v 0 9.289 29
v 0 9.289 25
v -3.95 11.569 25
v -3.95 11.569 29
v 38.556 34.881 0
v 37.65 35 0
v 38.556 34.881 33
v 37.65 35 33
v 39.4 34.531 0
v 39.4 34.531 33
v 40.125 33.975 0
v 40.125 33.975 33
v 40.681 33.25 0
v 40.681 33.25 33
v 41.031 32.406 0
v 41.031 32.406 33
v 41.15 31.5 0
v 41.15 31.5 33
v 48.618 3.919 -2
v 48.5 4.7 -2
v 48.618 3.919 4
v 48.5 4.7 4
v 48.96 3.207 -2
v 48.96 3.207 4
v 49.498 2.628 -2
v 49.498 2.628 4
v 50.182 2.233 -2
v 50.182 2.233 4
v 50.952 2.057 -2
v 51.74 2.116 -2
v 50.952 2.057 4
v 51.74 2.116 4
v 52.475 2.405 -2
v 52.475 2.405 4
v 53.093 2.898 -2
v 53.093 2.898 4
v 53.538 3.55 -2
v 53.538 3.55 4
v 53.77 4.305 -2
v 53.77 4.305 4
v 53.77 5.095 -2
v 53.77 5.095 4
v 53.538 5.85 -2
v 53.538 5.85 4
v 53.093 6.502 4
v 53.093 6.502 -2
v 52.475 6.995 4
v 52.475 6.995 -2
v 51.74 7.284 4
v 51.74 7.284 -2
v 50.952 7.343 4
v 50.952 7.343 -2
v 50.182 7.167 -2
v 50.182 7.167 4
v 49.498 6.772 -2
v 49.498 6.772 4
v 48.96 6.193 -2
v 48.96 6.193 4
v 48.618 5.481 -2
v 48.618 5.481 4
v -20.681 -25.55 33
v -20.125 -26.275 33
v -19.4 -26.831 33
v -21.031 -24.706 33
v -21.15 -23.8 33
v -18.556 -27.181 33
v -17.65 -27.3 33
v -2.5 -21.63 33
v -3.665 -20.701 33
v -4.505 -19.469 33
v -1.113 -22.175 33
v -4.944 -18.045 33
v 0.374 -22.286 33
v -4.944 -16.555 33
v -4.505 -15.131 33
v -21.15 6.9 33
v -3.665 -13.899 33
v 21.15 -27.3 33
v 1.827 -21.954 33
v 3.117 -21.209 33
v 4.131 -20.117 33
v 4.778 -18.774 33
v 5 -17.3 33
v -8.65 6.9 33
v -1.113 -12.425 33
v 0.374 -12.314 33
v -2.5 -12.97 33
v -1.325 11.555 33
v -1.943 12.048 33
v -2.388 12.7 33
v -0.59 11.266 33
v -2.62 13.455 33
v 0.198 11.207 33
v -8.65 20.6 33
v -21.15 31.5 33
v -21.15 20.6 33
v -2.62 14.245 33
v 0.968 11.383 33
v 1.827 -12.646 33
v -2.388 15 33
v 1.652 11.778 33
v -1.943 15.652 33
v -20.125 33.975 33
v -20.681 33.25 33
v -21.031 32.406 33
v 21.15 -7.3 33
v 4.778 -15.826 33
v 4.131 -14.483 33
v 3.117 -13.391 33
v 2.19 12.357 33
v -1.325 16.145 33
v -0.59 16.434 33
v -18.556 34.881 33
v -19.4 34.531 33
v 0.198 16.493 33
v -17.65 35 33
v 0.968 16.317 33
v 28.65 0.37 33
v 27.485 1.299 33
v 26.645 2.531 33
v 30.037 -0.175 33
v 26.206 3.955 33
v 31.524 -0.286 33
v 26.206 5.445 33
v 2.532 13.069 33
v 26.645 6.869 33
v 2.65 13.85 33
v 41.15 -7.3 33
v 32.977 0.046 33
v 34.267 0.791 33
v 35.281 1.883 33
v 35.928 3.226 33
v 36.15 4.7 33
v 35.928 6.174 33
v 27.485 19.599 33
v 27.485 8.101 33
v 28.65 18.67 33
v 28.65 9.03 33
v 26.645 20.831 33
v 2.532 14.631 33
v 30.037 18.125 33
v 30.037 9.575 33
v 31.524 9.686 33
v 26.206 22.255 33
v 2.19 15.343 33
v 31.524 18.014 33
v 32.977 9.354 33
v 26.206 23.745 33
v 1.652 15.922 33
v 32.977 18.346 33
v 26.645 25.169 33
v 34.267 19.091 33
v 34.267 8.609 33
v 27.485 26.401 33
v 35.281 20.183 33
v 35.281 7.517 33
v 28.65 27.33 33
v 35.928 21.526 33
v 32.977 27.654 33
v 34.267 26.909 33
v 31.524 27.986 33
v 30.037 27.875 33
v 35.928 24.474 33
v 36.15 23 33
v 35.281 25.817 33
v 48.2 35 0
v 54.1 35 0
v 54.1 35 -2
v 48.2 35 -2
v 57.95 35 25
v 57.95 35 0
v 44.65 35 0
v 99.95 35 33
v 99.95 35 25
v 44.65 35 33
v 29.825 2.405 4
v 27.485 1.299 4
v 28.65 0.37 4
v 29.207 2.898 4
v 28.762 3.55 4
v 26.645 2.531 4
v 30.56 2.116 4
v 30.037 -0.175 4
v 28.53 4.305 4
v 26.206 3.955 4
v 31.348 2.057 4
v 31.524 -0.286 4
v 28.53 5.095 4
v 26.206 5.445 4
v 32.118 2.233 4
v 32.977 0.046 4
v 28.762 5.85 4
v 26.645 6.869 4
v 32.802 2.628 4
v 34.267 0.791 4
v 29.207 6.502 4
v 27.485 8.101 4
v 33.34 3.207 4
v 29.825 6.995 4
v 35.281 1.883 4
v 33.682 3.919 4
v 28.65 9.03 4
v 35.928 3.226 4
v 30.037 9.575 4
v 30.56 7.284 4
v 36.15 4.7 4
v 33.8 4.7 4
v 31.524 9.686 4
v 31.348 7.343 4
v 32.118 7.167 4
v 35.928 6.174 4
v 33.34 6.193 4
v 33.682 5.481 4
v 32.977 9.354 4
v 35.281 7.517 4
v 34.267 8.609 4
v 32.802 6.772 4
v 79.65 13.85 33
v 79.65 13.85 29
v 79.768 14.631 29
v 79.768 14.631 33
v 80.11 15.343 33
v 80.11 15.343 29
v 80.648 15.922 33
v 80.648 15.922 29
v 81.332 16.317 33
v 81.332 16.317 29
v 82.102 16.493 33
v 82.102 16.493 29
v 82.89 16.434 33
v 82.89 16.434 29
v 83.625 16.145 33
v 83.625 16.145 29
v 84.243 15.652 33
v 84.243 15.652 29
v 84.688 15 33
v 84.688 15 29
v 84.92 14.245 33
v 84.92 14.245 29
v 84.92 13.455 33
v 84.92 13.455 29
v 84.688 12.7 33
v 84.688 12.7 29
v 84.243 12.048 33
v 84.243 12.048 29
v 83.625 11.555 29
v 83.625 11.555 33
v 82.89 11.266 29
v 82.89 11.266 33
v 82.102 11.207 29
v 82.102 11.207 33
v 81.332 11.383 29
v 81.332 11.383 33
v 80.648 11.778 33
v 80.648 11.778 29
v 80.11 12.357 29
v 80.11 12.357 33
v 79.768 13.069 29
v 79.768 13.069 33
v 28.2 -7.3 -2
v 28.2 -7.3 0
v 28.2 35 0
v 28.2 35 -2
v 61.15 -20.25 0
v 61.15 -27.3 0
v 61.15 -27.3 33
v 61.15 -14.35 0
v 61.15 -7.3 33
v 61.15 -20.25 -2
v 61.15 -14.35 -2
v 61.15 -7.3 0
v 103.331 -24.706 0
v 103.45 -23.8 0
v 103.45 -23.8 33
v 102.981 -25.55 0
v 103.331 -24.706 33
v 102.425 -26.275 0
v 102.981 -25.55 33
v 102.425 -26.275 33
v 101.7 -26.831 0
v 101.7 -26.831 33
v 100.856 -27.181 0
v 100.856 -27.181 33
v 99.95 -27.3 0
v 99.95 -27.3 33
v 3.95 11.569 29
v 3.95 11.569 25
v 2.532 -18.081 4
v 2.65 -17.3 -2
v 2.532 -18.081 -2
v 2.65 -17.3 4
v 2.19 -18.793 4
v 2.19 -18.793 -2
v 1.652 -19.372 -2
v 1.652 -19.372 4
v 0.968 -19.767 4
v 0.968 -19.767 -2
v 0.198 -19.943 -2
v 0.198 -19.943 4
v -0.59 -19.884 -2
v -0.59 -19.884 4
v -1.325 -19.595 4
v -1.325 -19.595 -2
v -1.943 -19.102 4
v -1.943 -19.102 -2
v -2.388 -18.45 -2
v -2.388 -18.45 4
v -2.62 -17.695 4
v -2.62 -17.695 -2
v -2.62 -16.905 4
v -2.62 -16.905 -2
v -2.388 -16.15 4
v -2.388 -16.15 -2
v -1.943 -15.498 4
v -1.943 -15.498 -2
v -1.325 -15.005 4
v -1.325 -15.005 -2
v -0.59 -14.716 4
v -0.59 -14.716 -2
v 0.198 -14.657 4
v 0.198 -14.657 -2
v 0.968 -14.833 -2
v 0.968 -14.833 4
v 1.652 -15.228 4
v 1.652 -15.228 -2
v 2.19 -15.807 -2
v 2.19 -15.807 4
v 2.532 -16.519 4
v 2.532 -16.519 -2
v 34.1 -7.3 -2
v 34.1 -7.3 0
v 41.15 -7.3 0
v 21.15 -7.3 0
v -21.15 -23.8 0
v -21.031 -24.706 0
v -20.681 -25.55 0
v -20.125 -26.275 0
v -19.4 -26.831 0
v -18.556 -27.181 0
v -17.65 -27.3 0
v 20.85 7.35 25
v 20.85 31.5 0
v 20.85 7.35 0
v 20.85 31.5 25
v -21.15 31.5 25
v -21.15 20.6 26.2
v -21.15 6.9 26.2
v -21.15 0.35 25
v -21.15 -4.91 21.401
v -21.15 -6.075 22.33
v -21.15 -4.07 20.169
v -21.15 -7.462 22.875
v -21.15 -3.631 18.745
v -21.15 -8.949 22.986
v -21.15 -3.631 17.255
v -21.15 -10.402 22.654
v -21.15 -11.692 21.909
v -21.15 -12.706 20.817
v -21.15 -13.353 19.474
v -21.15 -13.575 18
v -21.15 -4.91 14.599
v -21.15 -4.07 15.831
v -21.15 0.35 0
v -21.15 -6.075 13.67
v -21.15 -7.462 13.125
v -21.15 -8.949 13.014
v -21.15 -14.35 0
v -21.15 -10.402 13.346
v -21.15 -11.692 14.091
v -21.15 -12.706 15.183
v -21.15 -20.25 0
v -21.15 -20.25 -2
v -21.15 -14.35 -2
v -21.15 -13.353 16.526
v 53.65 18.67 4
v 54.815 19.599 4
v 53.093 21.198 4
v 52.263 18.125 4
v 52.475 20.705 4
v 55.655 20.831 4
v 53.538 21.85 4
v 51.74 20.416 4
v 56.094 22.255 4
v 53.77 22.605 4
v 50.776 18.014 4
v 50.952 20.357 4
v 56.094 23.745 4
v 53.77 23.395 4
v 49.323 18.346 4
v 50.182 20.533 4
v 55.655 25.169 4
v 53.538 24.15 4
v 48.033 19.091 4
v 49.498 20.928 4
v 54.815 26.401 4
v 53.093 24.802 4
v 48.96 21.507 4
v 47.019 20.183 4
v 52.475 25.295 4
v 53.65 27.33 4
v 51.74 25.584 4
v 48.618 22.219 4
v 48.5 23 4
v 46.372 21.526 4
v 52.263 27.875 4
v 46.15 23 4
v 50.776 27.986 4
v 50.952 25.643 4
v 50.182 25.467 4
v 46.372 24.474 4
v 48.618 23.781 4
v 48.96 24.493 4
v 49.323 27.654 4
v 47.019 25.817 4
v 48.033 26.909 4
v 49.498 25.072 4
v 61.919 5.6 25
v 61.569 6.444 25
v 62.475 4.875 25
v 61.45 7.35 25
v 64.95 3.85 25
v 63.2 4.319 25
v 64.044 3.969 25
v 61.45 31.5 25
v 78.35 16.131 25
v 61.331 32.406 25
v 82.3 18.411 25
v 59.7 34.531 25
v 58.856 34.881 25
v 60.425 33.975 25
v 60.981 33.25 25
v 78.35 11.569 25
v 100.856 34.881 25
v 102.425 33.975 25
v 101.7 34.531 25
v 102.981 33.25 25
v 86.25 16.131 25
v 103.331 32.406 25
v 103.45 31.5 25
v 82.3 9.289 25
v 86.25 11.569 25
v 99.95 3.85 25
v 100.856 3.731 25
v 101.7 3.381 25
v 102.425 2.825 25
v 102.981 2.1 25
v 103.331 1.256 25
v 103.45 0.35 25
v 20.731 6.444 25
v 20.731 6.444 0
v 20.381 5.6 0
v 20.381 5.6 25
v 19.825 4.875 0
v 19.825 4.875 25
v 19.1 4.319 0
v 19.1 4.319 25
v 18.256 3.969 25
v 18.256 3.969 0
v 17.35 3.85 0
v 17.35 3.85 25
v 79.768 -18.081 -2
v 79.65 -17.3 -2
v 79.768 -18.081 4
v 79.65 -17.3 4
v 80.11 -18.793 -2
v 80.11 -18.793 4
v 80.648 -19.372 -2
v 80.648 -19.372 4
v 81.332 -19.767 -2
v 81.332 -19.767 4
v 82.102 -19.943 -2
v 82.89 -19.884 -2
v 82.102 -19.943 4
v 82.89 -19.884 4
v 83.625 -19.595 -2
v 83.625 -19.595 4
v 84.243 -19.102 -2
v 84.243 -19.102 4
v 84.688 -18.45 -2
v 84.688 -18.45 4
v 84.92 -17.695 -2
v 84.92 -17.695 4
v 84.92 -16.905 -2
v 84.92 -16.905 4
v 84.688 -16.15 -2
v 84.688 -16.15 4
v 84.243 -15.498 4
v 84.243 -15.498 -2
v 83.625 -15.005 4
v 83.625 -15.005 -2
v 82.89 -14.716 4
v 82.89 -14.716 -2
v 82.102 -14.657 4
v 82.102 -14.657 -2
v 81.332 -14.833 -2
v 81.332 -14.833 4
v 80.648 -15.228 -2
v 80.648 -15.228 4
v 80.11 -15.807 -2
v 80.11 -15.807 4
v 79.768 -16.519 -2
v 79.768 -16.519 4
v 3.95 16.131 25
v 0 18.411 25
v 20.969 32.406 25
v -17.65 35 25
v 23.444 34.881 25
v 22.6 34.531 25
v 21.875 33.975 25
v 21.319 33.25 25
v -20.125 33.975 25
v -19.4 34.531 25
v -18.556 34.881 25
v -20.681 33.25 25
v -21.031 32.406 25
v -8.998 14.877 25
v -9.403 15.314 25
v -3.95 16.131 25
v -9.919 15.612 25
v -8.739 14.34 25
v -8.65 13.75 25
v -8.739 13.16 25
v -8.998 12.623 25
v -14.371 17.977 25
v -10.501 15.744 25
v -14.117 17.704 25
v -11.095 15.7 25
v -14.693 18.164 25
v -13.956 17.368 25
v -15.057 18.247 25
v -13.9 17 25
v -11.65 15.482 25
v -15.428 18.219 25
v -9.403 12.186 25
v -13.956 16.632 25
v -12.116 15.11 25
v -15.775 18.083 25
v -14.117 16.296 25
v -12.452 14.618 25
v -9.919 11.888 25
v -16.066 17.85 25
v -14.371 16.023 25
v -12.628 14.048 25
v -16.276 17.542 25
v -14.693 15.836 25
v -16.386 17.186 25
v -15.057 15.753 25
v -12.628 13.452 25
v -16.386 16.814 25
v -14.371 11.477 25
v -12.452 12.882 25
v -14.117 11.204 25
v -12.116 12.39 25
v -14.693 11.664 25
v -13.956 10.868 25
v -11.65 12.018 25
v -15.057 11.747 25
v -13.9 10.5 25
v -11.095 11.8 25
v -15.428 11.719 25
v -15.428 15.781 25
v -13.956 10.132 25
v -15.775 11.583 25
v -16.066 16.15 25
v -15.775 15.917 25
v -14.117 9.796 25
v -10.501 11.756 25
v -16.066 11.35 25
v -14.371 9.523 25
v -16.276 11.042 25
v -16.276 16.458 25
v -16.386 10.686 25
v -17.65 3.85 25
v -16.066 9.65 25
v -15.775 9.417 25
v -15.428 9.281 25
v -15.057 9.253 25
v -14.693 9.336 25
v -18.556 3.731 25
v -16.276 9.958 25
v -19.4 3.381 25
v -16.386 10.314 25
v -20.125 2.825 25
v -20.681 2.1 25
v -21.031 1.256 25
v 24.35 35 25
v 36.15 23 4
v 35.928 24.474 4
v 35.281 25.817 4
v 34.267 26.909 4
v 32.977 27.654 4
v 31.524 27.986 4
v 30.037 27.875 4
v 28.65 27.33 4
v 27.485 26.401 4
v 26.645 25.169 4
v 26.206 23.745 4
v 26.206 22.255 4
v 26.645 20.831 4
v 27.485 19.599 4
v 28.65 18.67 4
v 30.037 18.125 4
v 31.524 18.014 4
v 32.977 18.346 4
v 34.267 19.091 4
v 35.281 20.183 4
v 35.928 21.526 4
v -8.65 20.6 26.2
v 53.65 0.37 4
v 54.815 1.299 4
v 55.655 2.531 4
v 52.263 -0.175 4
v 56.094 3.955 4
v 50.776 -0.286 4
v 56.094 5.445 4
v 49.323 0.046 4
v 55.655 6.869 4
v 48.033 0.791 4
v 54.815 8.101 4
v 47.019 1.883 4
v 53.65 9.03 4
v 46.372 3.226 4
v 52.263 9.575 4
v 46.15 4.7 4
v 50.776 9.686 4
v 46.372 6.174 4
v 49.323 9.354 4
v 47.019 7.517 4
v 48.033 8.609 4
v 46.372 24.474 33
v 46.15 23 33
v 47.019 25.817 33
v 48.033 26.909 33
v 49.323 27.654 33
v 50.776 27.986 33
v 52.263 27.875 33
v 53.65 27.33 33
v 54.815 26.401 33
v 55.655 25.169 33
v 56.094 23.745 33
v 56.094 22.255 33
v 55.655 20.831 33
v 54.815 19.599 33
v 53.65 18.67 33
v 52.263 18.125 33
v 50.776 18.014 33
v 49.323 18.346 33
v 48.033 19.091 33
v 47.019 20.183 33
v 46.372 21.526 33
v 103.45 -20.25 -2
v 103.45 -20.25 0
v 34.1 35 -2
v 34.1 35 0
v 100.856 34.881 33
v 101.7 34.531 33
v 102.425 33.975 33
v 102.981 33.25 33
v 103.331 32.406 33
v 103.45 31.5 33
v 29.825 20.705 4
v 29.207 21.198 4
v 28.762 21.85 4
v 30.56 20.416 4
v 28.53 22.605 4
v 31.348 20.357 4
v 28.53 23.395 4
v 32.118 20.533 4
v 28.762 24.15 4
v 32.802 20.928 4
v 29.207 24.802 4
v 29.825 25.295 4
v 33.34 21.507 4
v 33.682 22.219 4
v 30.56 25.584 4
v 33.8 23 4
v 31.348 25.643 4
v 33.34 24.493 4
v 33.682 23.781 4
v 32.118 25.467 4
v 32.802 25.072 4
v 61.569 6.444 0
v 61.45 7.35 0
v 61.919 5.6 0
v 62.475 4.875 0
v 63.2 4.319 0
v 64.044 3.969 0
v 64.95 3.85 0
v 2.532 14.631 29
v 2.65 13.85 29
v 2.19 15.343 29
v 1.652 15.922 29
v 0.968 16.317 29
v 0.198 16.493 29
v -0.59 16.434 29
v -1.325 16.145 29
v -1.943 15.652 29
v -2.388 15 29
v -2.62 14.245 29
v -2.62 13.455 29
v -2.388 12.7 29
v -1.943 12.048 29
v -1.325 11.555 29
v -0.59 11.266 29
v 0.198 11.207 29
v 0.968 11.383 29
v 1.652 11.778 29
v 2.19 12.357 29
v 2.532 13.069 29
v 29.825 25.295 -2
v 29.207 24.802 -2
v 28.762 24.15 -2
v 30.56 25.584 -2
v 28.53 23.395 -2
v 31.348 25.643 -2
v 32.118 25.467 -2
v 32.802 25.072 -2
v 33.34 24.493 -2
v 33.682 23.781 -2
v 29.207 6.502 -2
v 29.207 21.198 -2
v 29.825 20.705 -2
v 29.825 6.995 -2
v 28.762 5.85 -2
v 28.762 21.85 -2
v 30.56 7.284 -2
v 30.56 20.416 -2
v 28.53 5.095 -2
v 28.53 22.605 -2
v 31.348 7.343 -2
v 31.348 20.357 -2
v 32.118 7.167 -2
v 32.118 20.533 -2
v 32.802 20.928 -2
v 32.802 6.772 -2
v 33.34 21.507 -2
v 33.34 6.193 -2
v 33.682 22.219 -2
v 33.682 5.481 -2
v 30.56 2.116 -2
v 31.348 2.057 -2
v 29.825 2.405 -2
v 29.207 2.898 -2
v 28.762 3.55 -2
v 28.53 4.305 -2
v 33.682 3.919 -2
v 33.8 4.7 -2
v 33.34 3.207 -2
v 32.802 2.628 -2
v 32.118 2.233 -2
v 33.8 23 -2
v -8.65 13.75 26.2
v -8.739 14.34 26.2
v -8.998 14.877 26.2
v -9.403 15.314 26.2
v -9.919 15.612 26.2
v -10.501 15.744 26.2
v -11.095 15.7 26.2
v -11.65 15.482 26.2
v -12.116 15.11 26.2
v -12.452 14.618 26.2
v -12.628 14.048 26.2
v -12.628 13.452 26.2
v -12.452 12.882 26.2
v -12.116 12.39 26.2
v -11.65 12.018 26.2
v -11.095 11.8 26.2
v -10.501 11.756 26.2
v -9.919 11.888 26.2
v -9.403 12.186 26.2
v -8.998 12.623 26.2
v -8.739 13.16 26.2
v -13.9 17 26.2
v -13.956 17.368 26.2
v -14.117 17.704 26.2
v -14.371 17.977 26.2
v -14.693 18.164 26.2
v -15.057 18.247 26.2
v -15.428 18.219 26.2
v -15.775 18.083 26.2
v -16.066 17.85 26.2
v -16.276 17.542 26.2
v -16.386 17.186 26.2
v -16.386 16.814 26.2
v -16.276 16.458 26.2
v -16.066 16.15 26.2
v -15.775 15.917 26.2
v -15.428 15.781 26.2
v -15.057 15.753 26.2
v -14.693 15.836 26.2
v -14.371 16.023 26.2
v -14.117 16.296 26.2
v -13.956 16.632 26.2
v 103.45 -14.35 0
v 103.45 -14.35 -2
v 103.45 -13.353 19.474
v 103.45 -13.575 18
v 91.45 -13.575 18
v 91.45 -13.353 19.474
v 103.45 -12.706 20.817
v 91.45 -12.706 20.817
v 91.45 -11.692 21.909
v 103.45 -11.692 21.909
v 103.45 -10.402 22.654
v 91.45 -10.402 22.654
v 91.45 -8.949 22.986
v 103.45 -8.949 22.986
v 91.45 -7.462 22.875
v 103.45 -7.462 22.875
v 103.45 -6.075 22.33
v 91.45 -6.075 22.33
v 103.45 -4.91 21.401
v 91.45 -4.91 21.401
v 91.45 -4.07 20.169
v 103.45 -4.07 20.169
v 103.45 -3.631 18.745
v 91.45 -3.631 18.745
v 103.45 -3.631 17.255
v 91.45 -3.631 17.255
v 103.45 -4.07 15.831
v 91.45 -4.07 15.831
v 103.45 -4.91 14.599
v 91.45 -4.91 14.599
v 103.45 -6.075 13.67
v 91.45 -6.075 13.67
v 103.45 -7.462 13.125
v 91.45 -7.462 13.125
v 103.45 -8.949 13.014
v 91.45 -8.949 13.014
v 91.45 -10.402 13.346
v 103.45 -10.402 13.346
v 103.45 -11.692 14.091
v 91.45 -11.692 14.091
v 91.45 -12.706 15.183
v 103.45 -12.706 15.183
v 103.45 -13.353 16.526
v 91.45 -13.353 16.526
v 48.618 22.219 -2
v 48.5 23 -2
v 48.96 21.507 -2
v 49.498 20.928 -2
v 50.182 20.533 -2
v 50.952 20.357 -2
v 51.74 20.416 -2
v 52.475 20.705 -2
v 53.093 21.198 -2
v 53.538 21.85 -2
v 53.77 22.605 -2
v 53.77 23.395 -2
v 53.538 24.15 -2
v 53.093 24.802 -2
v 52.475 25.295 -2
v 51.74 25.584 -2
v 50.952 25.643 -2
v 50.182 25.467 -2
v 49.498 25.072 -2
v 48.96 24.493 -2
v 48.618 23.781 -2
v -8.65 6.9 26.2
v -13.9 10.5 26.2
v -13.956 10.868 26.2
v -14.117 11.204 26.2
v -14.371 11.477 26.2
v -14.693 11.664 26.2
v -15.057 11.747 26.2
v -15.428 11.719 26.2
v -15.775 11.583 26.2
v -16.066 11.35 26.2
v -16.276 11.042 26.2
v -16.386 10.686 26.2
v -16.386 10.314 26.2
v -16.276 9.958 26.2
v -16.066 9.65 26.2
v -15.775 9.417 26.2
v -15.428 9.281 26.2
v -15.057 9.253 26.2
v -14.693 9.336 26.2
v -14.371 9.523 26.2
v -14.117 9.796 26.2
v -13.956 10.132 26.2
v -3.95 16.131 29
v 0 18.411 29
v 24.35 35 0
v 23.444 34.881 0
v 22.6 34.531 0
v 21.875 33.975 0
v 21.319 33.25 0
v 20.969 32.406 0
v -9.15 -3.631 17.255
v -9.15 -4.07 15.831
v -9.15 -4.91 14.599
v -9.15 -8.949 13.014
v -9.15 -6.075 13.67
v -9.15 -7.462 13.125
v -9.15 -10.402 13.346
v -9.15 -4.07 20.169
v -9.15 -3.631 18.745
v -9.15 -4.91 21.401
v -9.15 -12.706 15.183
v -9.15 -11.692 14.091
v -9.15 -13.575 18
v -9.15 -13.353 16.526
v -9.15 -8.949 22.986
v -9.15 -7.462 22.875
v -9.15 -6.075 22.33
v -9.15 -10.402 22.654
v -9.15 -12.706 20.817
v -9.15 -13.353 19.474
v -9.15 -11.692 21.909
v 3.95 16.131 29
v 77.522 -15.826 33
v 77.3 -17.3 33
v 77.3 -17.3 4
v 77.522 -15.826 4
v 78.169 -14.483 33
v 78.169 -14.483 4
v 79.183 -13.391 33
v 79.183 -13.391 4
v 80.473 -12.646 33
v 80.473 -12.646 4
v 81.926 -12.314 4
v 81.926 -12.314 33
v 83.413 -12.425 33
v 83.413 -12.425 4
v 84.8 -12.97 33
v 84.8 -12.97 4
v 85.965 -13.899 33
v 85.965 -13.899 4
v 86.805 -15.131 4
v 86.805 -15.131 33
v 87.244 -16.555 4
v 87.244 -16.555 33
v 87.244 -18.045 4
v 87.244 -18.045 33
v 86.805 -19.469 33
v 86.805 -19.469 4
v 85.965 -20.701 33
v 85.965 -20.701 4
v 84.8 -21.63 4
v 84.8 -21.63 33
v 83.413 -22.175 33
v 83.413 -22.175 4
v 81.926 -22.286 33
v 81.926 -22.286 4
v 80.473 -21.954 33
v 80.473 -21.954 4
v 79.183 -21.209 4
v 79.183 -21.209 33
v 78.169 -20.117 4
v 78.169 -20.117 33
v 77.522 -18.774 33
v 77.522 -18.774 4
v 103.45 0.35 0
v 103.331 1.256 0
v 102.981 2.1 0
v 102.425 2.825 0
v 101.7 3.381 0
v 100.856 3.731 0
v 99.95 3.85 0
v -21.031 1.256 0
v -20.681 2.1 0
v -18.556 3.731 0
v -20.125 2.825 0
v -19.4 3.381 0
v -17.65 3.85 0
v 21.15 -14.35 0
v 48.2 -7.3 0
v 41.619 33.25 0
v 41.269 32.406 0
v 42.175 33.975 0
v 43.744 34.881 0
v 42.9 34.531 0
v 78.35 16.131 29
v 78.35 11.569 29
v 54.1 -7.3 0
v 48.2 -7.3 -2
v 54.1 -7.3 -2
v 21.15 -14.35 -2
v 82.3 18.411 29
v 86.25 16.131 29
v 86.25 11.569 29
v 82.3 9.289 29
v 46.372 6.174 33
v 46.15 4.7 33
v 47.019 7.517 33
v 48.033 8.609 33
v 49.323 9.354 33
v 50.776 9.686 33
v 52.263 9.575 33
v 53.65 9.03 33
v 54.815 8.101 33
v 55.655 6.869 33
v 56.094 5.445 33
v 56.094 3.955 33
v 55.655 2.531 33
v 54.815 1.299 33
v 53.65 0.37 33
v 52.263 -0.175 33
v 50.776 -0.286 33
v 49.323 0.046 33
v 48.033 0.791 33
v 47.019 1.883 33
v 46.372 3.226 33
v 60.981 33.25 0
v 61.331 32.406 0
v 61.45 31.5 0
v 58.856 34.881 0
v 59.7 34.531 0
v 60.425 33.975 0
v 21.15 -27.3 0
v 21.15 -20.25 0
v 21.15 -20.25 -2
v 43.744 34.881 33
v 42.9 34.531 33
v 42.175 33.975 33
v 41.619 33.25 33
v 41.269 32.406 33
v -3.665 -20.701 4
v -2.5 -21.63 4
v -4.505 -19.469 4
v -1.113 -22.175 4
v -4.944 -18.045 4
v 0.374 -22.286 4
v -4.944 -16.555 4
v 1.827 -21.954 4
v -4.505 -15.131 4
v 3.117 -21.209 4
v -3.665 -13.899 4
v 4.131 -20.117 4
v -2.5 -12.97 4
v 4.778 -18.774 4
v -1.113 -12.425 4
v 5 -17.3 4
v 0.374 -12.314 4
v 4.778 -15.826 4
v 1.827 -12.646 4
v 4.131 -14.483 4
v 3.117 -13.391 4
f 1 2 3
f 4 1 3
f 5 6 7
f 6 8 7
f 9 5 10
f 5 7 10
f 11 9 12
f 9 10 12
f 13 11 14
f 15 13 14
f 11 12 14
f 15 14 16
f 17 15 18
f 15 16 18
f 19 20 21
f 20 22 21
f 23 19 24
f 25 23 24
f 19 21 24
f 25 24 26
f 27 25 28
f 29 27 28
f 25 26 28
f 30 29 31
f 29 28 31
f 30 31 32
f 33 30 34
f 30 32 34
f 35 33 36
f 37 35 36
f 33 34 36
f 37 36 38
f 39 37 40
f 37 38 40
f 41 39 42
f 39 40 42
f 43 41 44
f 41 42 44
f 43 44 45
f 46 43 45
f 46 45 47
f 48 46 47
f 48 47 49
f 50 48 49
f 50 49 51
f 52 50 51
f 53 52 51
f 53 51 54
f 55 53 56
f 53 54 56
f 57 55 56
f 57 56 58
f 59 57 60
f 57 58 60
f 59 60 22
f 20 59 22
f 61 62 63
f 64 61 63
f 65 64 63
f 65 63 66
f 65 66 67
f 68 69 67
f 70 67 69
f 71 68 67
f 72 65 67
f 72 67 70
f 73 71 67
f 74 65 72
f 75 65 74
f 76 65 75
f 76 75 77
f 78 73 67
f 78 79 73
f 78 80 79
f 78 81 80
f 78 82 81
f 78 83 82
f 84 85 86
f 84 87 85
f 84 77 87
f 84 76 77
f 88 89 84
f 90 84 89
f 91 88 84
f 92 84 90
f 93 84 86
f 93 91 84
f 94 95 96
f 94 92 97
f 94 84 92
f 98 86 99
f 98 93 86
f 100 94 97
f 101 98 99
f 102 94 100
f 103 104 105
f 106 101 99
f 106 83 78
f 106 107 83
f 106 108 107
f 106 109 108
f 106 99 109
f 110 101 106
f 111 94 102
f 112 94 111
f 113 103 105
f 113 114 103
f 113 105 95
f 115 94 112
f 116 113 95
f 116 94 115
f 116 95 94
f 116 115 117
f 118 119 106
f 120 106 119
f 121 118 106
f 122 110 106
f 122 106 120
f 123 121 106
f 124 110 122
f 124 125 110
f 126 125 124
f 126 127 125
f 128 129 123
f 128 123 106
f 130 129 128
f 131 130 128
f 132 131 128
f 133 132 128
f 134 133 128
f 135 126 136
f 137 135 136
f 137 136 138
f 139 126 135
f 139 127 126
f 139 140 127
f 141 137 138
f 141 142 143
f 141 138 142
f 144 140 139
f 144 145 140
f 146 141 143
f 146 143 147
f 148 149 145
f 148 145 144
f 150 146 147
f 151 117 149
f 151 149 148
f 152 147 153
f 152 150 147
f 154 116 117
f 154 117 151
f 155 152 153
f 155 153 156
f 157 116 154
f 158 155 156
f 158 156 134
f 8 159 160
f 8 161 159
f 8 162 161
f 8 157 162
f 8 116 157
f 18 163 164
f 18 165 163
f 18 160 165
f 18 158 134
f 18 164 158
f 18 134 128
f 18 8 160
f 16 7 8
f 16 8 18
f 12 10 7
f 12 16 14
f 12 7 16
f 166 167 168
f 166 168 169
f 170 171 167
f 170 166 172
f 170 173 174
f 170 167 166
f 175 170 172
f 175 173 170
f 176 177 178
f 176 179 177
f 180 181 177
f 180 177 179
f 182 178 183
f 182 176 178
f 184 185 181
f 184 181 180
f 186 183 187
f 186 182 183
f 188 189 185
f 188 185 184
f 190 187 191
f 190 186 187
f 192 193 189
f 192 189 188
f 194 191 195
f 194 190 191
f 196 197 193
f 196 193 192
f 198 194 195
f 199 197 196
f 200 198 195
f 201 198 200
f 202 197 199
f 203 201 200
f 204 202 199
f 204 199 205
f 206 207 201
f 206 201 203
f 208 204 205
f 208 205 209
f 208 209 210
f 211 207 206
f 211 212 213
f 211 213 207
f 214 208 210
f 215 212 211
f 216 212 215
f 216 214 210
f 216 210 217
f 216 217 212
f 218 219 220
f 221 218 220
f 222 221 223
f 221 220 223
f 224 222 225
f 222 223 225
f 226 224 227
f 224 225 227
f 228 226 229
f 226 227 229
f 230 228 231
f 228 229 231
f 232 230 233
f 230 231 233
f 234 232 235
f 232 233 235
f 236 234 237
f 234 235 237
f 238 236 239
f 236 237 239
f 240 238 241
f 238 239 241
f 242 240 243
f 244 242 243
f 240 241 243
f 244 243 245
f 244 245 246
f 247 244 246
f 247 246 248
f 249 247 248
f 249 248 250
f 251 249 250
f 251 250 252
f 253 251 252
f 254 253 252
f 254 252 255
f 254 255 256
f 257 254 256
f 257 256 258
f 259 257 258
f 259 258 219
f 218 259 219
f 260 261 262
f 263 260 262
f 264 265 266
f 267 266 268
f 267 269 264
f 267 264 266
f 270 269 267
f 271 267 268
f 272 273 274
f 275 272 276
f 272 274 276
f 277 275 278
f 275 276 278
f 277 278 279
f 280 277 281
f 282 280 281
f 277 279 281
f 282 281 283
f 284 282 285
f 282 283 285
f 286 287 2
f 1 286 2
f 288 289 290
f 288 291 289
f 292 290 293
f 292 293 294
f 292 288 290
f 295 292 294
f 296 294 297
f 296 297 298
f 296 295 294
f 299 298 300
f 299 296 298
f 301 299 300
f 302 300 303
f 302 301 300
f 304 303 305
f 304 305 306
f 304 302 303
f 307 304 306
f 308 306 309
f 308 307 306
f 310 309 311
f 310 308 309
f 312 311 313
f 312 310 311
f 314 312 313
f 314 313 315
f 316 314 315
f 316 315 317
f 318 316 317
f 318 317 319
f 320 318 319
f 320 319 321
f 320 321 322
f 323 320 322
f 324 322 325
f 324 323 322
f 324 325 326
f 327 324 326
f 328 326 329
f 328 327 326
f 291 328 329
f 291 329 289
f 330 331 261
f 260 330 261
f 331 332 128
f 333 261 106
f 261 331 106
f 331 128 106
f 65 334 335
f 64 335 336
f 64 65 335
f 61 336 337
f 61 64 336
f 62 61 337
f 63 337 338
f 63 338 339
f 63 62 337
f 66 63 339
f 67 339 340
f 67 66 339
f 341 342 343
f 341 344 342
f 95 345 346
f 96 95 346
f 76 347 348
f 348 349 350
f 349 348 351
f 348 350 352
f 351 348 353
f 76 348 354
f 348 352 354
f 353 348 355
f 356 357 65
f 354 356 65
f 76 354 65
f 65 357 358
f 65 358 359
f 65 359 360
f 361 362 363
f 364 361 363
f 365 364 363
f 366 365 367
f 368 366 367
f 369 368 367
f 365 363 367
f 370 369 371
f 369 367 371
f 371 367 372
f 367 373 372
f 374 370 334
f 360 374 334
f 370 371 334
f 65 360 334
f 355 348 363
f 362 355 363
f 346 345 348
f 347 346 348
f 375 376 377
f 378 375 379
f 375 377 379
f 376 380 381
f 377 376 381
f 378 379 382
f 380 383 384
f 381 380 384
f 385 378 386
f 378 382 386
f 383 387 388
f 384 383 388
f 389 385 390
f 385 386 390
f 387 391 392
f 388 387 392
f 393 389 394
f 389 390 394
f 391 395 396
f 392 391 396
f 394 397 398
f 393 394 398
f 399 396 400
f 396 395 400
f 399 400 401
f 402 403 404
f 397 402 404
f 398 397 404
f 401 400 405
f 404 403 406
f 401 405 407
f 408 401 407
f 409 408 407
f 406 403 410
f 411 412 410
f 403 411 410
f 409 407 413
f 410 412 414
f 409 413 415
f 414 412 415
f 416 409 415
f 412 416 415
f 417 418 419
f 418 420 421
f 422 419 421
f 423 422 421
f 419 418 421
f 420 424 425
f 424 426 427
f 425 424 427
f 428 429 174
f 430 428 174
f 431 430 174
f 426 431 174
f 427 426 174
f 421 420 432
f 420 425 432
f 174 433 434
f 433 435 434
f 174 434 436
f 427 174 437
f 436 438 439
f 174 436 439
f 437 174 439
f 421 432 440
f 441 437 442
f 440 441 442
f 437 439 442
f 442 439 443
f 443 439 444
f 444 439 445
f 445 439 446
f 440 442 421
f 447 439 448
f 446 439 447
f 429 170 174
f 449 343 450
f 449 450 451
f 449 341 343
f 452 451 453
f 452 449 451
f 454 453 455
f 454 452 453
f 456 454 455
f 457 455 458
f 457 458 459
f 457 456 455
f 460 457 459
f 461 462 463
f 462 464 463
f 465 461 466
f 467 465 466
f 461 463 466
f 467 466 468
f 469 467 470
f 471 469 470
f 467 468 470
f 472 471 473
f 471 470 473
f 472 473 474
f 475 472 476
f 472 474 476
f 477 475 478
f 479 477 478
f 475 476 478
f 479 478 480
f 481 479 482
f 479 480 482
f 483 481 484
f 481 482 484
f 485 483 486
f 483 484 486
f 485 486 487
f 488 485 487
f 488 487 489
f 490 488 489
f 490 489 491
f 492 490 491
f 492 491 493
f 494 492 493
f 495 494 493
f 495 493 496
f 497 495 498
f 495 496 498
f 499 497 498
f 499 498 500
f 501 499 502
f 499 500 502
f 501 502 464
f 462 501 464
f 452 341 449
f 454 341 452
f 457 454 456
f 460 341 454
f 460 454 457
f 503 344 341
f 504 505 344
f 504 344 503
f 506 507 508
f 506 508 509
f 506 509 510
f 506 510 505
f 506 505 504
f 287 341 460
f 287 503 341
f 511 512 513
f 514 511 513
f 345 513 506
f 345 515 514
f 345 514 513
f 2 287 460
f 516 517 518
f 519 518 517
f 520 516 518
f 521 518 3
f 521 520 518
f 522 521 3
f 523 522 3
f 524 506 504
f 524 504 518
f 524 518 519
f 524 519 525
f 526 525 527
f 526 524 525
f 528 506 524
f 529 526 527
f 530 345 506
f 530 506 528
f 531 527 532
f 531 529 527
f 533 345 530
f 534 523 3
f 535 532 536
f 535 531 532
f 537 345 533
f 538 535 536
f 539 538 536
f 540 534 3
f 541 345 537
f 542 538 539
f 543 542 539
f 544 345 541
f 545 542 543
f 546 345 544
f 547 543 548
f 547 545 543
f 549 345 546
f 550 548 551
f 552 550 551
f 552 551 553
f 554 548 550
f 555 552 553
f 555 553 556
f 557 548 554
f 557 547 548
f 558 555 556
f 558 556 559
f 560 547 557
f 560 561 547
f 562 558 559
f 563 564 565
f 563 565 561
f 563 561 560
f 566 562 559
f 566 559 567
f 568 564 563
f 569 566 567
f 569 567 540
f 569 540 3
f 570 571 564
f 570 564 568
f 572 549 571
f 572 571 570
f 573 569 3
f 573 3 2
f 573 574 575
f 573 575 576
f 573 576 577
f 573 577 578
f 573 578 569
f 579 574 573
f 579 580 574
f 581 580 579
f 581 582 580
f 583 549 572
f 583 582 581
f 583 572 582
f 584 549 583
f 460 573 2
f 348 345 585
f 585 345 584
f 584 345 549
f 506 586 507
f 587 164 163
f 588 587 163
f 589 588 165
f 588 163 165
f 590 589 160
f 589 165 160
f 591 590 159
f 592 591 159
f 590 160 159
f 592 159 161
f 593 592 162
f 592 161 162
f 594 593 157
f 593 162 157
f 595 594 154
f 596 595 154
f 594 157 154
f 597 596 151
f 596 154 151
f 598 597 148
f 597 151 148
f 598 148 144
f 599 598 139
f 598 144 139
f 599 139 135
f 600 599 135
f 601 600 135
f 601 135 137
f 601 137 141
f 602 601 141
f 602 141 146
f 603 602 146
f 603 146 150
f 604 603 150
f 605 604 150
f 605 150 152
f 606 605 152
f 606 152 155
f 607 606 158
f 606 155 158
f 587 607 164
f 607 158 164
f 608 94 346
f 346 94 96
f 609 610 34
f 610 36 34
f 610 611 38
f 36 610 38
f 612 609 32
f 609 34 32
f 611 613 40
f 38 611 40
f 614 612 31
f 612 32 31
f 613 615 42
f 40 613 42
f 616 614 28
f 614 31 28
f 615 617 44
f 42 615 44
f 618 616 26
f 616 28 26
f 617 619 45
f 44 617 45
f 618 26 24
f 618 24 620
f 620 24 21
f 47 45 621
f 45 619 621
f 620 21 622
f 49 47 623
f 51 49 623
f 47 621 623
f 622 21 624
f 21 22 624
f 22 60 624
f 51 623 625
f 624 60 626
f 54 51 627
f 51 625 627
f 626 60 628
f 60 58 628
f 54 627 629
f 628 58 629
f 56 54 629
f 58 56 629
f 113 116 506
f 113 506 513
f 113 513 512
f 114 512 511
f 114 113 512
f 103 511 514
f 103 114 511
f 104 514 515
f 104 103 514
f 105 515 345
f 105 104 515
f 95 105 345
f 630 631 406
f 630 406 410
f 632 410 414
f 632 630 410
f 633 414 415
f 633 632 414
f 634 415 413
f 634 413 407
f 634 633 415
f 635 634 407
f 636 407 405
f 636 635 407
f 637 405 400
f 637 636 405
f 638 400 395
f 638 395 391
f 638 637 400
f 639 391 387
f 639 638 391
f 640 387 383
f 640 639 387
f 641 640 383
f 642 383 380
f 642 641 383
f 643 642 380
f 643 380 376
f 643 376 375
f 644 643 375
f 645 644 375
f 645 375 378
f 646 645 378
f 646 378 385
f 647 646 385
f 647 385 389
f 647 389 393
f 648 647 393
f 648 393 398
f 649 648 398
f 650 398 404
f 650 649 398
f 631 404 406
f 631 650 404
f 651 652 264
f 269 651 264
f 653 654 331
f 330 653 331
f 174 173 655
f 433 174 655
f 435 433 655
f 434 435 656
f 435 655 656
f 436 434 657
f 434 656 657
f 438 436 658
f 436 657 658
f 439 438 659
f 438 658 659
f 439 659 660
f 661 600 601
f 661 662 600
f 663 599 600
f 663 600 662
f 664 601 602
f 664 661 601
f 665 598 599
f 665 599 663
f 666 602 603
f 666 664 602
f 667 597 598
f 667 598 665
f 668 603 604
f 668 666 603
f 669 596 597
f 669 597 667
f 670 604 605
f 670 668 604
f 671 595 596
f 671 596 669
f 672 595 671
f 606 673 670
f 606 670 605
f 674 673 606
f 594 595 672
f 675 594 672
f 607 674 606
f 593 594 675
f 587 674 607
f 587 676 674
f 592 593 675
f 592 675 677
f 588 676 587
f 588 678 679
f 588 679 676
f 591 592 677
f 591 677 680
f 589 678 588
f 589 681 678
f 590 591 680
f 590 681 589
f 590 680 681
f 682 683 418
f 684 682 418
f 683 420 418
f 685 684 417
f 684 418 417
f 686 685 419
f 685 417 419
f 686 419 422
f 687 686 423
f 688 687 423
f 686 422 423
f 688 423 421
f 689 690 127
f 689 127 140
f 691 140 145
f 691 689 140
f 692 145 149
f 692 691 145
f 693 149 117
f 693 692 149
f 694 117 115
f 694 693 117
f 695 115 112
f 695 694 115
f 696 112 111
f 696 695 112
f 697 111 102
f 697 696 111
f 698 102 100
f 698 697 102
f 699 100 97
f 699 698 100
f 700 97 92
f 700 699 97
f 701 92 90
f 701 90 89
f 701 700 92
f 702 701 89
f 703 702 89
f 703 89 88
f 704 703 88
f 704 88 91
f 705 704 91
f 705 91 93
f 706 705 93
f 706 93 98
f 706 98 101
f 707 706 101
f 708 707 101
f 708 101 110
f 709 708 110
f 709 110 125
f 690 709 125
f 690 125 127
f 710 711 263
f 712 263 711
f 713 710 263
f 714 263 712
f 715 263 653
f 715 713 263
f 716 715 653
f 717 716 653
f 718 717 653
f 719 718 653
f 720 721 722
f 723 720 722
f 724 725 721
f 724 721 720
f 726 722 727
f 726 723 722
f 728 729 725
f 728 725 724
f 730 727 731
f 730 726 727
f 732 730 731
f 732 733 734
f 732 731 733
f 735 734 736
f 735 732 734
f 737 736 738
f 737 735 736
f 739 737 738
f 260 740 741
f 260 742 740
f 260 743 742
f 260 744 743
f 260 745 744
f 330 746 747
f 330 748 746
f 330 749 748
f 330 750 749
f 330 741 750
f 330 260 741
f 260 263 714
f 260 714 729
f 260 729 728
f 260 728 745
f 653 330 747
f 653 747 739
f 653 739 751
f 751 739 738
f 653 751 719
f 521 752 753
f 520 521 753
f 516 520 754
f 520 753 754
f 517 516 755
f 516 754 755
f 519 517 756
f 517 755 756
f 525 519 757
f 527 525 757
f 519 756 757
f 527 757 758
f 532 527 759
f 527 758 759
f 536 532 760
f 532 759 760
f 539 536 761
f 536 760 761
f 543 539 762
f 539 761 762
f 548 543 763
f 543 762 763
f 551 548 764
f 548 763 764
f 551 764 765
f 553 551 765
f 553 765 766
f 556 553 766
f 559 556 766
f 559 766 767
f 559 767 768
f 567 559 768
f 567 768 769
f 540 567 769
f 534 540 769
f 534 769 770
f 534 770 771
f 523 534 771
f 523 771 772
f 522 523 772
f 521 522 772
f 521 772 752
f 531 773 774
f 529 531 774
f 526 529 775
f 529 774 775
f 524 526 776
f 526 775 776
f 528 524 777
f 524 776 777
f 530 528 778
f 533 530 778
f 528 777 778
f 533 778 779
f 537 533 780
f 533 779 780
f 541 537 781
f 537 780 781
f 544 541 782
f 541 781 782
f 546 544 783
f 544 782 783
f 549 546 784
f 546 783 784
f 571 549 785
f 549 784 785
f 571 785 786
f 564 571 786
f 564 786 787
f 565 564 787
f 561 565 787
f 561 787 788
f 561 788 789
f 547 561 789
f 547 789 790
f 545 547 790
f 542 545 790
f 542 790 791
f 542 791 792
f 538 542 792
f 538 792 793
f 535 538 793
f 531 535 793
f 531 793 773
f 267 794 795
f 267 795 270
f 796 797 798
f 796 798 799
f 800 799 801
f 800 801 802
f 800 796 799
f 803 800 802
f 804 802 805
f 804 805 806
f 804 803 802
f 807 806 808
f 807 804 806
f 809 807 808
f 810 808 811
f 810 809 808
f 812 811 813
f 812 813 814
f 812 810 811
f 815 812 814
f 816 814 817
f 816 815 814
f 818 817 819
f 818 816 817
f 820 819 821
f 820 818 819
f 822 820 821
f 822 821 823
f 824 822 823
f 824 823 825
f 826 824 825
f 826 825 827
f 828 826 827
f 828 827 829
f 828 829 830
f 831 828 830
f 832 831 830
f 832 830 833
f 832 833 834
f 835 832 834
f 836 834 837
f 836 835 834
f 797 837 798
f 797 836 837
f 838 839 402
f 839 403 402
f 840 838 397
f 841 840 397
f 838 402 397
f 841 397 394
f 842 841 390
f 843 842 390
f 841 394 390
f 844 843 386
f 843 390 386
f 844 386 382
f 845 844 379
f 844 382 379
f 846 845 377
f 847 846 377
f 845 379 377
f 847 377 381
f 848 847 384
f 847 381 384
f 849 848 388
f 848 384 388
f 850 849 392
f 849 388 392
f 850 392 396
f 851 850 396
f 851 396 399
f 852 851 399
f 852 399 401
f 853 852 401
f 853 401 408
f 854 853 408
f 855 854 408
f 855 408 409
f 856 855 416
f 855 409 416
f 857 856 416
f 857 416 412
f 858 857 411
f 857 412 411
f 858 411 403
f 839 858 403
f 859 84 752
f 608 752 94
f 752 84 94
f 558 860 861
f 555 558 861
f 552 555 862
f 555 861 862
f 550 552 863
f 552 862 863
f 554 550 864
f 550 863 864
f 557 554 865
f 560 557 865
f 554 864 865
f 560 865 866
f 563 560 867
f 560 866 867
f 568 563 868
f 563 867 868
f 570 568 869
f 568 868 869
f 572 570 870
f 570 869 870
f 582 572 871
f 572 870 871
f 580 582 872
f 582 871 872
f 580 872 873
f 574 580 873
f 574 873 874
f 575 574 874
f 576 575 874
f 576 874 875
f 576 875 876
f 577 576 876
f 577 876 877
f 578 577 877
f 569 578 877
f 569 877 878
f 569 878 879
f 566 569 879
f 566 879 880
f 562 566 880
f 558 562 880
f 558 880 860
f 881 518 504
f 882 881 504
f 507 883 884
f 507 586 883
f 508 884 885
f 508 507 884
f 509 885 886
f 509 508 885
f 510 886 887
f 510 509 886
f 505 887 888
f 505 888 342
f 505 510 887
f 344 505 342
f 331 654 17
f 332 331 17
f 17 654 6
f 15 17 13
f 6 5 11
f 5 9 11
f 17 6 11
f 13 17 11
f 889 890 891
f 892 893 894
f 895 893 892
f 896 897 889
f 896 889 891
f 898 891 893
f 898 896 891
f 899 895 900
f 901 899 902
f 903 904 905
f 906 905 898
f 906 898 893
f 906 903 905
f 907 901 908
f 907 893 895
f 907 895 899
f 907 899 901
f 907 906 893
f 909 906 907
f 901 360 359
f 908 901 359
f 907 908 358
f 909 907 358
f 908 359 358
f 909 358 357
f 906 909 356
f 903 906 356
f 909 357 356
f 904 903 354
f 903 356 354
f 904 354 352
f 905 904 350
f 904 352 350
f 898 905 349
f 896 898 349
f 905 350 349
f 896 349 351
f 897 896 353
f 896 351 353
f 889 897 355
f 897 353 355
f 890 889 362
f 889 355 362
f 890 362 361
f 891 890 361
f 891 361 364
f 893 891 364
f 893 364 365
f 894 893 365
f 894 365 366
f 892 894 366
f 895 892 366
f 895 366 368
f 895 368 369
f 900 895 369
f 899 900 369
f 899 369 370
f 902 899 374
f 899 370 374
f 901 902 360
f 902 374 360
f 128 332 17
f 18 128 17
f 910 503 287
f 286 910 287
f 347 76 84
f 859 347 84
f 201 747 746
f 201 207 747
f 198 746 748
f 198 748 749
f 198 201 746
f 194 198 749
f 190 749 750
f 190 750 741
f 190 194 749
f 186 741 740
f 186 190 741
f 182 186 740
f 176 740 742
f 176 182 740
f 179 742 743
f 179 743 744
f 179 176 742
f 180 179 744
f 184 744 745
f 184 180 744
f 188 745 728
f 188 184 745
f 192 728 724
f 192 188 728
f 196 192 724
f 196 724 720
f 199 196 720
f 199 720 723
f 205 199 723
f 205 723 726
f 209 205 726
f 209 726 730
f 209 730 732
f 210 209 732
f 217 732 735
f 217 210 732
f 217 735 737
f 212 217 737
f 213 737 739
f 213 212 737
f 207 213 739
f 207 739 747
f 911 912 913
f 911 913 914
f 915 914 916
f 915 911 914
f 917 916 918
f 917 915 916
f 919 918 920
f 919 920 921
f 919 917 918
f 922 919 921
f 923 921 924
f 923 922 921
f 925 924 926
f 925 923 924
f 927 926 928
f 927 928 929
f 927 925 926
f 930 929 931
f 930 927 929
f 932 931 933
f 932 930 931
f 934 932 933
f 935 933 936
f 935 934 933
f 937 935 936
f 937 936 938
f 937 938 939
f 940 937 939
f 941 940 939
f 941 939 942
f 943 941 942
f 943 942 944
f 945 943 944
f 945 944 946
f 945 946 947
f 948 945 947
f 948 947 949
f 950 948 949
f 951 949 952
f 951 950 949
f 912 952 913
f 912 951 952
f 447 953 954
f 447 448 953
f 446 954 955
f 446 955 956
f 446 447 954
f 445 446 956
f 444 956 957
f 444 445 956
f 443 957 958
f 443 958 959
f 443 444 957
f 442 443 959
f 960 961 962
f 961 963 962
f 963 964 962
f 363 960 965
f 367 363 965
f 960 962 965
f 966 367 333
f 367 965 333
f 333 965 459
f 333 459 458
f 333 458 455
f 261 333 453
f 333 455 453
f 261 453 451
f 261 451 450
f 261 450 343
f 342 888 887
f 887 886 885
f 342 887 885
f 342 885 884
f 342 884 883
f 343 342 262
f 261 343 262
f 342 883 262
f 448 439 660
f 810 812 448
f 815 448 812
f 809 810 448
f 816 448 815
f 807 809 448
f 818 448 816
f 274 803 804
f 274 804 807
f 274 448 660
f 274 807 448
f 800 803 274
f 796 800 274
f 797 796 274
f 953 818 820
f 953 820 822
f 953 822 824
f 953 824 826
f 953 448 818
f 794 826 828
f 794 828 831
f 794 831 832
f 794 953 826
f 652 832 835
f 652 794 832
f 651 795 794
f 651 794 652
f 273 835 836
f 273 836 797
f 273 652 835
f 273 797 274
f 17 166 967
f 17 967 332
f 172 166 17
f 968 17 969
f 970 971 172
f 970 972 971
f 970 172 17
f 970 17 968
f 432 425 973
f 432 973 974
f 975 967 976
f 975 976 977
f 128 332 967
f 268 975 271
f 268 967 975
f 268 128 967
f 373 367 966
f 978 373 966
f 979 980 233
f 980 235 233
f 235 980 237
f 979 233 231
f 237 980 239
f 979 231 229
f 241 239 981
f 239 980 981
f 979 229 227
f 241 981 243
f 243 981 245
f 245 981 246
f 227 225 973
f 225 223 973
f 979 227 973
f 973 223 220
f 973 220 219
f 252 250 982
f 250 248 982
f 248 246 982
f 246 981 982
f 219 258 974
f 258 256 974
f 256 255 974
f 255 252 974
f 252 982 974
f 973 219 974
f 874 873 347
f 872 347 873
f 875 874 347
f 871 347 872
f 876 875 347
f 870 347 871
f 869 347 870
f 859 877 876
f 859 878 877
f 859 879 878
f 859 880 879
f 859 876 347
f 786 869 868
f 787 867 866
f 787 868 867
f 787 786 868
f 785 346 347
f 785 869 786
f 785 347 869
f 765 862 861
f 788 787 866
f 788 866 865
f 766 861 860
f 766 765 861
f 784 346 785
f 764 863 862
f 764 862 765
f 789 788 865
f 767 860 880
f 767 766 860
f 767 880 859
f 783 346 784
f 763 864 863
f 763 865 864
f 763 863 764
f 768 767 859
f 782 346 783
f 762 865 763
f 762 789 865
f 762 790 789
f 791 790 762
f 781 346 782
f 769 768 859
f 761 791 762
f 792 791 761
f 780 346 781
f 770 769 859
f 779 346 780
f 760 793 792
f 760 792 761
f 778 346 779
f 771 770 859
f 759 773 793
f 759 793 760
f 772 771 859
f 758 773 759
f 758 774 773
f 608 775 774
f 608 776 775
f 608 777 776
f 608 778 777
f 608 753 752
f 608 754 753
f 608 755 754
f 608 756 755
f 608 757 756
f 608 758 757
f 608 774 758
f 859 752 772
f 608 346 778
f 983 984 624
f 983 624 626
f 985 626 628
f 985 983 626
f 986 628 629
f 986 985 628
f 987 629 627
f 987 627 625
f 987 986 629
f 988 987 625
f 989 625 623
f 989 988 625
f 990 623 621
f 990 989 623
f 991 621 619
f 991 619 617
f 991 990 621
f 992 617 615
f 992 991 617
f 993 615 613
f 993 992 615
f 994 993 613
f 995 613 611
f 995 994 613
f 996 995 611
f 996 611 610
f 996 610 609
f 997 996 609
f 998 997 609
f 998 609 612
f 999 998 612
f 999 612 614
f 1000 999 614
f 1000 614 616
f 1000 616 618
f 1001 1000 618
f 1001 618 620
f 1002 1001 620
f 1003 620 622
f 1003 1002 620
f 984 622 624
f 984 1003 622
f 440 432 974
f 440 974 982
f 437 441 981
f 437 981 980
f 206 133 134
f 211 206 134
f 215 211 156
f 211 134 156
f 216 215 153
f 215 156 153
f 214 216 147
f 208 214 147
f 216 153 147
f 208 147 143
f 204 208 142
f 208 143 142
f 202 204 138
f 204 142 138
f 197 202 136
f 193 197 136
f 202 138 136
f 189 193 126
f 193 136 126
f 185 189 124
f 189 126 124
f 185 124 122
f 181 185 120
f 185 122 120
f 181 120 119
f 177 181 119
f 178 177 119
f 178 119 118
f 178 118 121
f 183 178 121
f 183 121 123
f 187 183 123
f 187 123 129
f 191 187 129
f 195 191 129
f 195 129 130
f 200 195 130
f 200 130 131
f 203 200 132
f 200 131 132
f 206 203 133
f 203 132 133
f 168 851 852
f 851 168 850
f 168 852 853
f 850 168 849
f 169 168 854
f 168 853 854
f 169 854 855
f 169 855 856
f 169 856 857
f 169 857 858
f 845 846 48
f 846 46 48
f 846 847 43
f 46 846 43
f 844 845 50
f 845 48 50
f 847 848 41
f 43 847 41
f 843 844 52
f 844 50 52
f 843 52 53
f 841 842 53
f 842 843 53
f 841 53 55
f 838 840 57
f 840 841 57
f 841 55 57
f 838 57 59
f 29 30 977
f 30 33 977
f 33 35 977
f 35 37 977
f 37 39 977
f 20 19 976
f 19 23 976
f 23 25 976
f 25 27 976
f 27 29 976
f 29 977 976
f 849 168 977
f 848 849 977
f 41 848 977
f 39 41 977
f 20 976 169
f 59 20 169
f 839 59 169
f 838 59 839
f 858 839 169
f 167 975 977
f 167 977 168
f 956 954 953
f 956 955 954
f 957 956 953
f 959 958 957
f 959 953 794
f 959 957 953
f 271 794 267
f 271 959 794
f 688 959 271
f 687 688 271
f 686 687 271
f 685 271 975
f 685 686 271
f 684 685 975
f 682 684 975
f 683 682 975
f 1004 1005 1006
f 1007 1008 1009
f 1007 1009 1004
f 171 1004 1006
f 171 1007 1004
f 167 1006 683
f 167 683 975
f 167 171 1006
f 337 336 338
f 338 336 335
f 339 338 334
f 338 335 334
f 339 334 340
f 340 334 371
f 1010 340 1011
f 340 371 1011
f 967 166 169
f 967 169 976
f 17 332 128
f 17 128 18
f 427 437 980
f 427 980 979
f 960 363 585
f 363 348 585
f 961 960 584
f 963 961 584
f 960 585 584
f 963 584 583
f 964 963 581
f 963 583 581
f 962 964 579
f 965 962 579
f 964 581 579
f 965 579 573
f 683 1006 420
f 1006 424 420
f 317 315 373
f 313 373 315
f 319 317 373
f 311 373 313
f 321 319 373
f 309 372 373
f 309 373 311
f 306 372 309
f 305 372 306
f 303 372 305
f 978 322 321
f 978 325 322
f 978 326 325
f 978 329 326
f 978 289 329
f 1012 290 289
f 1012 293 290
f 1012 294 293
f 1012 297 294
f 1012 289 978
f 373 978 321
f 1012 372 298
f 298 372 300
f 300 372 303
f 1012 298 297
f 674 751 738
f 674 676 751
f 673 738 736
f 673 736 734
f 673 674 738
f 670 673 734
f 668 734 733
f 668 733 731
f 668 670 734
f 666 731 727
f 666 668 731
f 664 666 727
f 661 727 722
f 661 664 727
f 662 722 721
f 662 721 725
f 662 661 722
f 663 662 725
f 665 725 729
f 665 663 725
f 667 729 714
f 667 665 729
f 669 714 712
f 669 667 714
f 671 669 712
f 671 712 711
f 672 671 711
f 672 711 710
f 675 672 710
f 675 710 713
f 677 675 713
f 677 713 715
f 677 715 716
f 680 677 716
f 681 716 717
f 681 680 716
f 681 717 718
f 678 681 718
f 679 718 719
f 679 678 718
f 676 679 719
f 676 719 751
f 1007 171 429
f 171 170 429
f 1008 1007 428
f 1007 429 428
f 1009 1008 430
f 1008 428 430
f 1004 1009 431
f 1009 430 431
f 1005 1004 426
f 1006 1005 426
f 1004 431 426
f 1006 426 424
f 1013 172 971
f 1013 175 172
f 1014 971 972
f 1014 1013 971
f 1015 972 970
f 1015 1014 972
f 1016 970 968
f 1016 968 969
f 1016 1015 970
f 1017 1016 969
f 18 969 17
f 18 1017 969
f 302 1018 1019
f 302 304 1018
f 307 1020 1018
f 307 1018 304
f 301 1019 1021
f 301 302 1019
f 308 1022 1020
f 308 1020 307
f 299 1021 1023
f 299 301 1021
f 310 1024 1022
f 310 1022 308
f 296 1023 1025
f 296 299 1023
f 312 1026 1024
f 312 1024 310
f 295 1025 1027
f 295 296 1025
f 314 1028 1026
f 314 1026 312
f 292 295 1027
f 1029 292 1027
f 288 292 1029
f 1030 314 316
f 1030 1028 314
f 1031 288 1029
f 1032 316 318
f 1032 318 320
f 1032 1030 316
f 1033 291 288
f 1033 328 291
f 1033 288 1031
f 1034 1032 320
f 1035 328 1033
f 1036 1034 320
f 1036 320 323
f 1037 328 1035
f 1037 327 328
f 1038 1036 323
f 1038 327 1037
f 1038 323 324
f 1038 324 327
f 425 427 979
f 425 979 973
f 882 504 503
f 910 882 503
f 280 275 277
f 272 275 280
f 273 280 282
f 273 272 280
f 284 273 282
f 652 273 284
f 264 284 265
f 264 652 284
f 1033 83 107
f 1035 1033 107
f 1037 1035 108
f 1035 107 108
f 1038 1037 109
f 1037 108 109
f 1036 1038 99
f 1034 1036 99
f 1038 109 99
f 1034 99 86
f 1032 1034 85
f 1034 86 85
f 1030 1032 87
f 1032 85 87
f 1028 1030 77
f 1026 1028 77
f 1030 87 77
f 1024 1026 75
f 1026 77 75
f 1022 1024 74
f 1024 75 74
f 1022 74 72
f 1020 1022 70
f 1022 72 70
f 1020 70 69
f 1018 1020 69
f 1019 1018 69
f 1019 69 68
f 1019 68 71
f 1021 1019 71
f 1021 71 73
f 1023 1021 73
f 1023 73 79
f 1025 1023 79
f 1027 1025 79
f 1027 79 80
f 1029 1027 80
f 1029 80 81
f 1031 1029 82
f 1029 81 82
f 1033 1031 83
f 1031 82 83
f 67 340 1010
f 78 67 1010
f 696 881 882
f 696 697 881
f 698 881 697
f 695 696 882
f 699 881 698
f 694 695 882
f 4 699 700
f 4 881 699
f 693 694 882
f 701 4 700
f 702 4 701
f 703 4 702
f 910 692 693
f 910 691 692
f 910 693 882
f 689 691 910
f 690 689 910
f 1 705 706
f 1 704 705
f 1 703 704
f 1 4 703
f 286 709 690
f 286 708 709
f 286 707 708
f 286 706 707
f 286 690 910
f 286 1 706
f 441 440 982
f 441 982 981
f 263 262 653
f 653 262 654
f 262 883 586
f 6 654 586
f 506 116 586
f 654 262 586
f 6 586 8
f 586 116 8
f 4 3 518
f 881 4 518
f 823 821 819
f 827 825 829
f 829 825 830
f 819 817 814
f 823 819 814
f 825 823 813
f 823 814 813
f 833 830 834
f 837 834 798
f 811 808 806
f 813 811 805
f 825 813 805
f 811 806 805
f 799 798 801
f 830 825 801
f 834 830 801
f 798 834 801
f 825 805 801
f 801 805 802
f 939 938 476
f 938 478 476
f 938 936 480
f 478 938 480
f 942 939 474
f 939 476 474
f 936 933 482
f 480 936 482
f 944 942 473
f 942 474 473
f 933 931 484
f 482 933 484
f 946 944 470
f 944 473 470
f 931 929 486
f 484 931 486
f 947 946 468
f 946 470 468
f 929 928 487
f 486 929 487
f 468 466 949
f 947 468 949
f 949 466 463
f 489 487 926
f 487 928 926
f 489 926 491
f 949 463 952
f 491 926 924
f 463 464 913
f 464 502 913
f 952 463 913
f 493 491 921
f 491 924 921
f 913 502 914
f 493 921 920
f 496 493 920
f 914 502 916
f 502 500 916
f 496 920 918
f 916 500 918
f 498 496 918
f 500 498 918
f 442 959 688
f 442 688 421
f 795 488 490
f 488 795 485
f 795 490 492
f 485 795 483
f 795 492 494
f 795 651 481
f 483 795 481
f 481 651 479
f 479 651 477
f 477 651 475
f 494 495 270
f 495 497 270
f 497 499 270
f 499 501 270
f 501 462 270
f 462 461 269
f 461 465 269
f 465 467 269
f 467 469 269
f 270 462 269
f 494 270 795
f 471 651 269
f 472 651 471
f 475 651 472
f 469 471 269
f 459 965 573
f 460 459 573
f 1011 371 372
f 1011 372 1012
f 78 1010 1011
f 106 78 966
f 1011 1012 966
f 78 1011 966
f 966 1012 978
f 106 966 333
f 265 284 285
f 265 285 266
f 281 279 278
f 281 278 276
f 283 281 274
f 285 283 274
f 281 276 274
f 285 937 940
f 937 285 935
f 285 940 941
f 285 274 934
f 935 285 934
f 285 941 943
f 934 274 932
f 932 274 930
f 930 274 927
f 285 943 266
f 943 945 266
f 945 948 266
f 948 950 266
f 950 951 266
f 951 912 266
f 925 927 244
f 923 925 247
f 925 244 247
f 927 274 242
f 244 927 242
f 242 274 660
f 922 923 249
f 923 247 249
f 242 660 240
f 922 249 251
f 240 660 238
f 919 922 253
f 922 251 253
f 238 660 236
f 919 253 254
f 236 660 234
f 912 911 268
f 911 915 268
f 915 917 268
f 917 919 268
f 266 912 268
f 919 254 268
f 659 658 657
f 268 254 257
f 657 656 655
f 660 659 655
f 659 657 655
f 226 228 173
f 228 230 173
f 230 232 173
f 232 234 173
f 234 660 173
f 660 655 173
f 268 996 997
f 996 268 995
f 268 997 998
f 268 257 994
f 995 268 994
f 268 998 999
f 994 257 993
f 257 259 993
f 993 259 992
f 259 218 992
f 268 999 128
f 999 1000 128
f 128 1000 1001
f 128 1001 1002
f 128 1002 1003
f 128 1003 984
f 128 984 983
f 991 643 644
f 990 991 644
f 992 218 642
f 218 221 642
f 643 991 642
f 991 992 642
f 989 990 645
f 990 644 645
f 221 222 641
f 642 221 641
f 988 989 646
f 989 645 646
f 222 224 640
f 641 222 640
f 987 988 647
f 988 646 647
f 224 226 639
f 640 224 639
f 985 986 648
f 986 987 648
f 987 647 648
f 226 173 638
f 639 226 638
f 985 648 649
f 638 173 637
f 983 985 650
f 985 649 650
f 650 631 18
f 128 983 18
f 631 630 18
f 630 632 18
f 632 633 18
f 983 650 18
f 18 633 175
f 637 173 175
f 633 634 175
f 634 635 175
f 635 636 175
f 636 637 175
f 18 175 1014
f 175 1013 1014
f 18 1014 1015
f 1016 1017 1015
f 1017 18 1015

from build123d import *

# Parameters (mm, degrees)
F0_R      = 2.65
F1_DEPTH  = 33
F2_R      = 5
F3_DEPTH  = 12
F5_DEPTH  = 29
F6_R      = 5
F7_DEPTH  = 29
F8_R      = 2.65
F8_W      = 42.3
F8_H      = 5.9
F9_DEPTH  = 2
F10_R     = 3.5
F11_W     = 31.15
F11_H     = 25
F12_DEPTH = 42
F13_R     = 3.5
F15_W     = 7.5
F15_H     = 13.7
F15_W_2   = 5
F16_DEPTH = 6.8
F17_R     = 1.25
F18_DEPTH = 8
F19_R     = 2
F20_DEPTH = 30


with BuildPart() as f1:
    # F0 (on Top) → F1 (new body)
    with BuildSketch(Plane.XY):
        Polygon((41.15, 35), (-21.15, 35), (-21.15, -27.3), (21.15, -27.3), (21.15, -7.3), (41.15, -7.3), align=None)
        with Locations((0, -17.3)):
            Circle(F0_R, mode=Mode.SUBTRACT)
        with Locations((0, 13.85)):
            Circle(F0_R, mode=Mode.SUBTRACT)
        with Locations((31.15, 4.7)):
            Circle(F0_R, mode=Mode.SUBTRACT)
        with Locations((31.15, 23)):
            Circle(F0_R, mode=Mode.SUBTRACT)
    extrude(amount=F1_DEPTH)

    # F2 (on face) → F3 (cut)
    with BuildSketch(Plane(origin=(-21.15, 0, 0), x_dir=(0, -1, 0), z_dir=(-1, 0, 0))):
        with Locations((8.575, 18)):
            Circle(F2_R)
    extrude(amount=-F3_DEPTH, mode=Mode.SUBTRACT)

    # F4 (on face) → F5 (cut)
    with BuildSketch(Plane(origin=(0, 0, 0), x_dir=(1, 0, 0), z_dir=(0, 0, -1))):
        Polygon((-3.95, -11.5694664367), (-3.95, -16.1305335633), (0, -18.4110671266), (3.95, -16.1305335633), (3.95, -11.5694664367), (0, -9.2889328734), align=None)
    extrude(amount=-F5_DEPTH, mode=Mode.SUBTRACT)

    # F6 (on face) → F7 (cut)
    with BuildSketch(Plane.XY.offset(33)):
        with Locations((31.15, 23)):
            Circle(F6_R)
        with Locations((31.15, 4.7)):
            Circle(F6_R)
        with Locations((0, -17.3)):
            Circle(F6_R)
    extrude(amount=-F7_DEPTH, mode=Mode.SUBTRACT)

    # F8 (on face) → F9 (join)
    with BuildSketch(Plane(origin=(0, 0, 0), x_dir=(1, 0, 0), z_dir=(0, 0, -1))):
        Polygon((34.1, 7.3), (28.2, 7.3), (28.2, -13.5680906466), (28.2, -35), (34.1, -35), (34.1, -13.5680906466), align=None)
        with Locations((31.15, -23)):
            Circle(F8_R, mode=Mode.SUBTRACT)
        with Locations((31.15, -4.7)):
            Circle(F8_R, mode=Mode.SUBTRACT)
        with Locations((0, 17.3)):
            Rectangle(F8_W, F8_H)
        with Locations((0, 17.3)):
            Circle(F8_R, mode=Mode.SUBTRACT)
    extrude(amount=F9_DEPTH)

    # F10
    f10_edges = [f1.edges().sort_by_distance(p)[0] for p in [
        (-21.15, -27.3, 16.5),
        (-21.15, 35, 16.5),
        (41.15, 35, 16.5),
    ]]
    fillet(f10_edges, radius=F10_R)

    # F11 (on face) → F12 (cut)
    with BuildSketch(Plane(origin=(-21.15, 0, 0), x_dir=(0, -1, 0), z_dir=(-1, 0, 0))):
        with Locations((-19.425, 12.5)):
            Rectangle(F11_W, F11_H)
    extrude(amount=-F12_DEPTH, mode=Mode.SUBTRACT)

    # F13
    f13_edges = [f1.edges().sort_by_distance(p)[0] for p in [
        (-21.15, 3.85, 12.5),
        (20.85, 3.85, 12.5),
        (20.85, 35, 12.5),
    ]]
    fillet(f13_edges, radius=F13_R)


with BuildPart() as f14_1:
    # F14: instance of F1
    add(f1.part.mirror(Plane(origin=(41.15, 12.1, 16.5), x_dir=(0, 1, 0), z_dir=(1, 0, 0))))


with BuildPart() as f1_1:
    add(f1.part)

    # F15 (on face) → F16 (cut)
    with BuildSketch(Plane.XY.offset(33)):
        with Locations((-17.4, 13.75)):
            Rectangle(F15_W, F15_H)
        with Locations((-11.15, 13.75)):
            Rectangle(F15_W_2, F15_H)
    extrude(amount=-F16_DEPTH, mode=Mode.SUBTRACT)

    # F17 (on face) → F18 (cut)
    with BuildSketch(Plane.XY.offset(26.2)):
        with Locations((-15.15, 17)):
            Circle(F17_R)
        with Locations((-15.15, 10.5)):
            Circle(F17_R)
    extrude(amount=-F18_DEPTH, mode=Mode.SUBTRACT)

    # F19 (on face) → F20 (cut)
    with BuildSketch(Plane.XY.offset(26.2)):
        with Locations((-10.65, 13.75)):
            Circle(F19_R)
    extrude(amount=-F20_DEPTH, mode=Mode.SUBTRACT)


solid = Compound([f14_1.part, f1_1.part])
